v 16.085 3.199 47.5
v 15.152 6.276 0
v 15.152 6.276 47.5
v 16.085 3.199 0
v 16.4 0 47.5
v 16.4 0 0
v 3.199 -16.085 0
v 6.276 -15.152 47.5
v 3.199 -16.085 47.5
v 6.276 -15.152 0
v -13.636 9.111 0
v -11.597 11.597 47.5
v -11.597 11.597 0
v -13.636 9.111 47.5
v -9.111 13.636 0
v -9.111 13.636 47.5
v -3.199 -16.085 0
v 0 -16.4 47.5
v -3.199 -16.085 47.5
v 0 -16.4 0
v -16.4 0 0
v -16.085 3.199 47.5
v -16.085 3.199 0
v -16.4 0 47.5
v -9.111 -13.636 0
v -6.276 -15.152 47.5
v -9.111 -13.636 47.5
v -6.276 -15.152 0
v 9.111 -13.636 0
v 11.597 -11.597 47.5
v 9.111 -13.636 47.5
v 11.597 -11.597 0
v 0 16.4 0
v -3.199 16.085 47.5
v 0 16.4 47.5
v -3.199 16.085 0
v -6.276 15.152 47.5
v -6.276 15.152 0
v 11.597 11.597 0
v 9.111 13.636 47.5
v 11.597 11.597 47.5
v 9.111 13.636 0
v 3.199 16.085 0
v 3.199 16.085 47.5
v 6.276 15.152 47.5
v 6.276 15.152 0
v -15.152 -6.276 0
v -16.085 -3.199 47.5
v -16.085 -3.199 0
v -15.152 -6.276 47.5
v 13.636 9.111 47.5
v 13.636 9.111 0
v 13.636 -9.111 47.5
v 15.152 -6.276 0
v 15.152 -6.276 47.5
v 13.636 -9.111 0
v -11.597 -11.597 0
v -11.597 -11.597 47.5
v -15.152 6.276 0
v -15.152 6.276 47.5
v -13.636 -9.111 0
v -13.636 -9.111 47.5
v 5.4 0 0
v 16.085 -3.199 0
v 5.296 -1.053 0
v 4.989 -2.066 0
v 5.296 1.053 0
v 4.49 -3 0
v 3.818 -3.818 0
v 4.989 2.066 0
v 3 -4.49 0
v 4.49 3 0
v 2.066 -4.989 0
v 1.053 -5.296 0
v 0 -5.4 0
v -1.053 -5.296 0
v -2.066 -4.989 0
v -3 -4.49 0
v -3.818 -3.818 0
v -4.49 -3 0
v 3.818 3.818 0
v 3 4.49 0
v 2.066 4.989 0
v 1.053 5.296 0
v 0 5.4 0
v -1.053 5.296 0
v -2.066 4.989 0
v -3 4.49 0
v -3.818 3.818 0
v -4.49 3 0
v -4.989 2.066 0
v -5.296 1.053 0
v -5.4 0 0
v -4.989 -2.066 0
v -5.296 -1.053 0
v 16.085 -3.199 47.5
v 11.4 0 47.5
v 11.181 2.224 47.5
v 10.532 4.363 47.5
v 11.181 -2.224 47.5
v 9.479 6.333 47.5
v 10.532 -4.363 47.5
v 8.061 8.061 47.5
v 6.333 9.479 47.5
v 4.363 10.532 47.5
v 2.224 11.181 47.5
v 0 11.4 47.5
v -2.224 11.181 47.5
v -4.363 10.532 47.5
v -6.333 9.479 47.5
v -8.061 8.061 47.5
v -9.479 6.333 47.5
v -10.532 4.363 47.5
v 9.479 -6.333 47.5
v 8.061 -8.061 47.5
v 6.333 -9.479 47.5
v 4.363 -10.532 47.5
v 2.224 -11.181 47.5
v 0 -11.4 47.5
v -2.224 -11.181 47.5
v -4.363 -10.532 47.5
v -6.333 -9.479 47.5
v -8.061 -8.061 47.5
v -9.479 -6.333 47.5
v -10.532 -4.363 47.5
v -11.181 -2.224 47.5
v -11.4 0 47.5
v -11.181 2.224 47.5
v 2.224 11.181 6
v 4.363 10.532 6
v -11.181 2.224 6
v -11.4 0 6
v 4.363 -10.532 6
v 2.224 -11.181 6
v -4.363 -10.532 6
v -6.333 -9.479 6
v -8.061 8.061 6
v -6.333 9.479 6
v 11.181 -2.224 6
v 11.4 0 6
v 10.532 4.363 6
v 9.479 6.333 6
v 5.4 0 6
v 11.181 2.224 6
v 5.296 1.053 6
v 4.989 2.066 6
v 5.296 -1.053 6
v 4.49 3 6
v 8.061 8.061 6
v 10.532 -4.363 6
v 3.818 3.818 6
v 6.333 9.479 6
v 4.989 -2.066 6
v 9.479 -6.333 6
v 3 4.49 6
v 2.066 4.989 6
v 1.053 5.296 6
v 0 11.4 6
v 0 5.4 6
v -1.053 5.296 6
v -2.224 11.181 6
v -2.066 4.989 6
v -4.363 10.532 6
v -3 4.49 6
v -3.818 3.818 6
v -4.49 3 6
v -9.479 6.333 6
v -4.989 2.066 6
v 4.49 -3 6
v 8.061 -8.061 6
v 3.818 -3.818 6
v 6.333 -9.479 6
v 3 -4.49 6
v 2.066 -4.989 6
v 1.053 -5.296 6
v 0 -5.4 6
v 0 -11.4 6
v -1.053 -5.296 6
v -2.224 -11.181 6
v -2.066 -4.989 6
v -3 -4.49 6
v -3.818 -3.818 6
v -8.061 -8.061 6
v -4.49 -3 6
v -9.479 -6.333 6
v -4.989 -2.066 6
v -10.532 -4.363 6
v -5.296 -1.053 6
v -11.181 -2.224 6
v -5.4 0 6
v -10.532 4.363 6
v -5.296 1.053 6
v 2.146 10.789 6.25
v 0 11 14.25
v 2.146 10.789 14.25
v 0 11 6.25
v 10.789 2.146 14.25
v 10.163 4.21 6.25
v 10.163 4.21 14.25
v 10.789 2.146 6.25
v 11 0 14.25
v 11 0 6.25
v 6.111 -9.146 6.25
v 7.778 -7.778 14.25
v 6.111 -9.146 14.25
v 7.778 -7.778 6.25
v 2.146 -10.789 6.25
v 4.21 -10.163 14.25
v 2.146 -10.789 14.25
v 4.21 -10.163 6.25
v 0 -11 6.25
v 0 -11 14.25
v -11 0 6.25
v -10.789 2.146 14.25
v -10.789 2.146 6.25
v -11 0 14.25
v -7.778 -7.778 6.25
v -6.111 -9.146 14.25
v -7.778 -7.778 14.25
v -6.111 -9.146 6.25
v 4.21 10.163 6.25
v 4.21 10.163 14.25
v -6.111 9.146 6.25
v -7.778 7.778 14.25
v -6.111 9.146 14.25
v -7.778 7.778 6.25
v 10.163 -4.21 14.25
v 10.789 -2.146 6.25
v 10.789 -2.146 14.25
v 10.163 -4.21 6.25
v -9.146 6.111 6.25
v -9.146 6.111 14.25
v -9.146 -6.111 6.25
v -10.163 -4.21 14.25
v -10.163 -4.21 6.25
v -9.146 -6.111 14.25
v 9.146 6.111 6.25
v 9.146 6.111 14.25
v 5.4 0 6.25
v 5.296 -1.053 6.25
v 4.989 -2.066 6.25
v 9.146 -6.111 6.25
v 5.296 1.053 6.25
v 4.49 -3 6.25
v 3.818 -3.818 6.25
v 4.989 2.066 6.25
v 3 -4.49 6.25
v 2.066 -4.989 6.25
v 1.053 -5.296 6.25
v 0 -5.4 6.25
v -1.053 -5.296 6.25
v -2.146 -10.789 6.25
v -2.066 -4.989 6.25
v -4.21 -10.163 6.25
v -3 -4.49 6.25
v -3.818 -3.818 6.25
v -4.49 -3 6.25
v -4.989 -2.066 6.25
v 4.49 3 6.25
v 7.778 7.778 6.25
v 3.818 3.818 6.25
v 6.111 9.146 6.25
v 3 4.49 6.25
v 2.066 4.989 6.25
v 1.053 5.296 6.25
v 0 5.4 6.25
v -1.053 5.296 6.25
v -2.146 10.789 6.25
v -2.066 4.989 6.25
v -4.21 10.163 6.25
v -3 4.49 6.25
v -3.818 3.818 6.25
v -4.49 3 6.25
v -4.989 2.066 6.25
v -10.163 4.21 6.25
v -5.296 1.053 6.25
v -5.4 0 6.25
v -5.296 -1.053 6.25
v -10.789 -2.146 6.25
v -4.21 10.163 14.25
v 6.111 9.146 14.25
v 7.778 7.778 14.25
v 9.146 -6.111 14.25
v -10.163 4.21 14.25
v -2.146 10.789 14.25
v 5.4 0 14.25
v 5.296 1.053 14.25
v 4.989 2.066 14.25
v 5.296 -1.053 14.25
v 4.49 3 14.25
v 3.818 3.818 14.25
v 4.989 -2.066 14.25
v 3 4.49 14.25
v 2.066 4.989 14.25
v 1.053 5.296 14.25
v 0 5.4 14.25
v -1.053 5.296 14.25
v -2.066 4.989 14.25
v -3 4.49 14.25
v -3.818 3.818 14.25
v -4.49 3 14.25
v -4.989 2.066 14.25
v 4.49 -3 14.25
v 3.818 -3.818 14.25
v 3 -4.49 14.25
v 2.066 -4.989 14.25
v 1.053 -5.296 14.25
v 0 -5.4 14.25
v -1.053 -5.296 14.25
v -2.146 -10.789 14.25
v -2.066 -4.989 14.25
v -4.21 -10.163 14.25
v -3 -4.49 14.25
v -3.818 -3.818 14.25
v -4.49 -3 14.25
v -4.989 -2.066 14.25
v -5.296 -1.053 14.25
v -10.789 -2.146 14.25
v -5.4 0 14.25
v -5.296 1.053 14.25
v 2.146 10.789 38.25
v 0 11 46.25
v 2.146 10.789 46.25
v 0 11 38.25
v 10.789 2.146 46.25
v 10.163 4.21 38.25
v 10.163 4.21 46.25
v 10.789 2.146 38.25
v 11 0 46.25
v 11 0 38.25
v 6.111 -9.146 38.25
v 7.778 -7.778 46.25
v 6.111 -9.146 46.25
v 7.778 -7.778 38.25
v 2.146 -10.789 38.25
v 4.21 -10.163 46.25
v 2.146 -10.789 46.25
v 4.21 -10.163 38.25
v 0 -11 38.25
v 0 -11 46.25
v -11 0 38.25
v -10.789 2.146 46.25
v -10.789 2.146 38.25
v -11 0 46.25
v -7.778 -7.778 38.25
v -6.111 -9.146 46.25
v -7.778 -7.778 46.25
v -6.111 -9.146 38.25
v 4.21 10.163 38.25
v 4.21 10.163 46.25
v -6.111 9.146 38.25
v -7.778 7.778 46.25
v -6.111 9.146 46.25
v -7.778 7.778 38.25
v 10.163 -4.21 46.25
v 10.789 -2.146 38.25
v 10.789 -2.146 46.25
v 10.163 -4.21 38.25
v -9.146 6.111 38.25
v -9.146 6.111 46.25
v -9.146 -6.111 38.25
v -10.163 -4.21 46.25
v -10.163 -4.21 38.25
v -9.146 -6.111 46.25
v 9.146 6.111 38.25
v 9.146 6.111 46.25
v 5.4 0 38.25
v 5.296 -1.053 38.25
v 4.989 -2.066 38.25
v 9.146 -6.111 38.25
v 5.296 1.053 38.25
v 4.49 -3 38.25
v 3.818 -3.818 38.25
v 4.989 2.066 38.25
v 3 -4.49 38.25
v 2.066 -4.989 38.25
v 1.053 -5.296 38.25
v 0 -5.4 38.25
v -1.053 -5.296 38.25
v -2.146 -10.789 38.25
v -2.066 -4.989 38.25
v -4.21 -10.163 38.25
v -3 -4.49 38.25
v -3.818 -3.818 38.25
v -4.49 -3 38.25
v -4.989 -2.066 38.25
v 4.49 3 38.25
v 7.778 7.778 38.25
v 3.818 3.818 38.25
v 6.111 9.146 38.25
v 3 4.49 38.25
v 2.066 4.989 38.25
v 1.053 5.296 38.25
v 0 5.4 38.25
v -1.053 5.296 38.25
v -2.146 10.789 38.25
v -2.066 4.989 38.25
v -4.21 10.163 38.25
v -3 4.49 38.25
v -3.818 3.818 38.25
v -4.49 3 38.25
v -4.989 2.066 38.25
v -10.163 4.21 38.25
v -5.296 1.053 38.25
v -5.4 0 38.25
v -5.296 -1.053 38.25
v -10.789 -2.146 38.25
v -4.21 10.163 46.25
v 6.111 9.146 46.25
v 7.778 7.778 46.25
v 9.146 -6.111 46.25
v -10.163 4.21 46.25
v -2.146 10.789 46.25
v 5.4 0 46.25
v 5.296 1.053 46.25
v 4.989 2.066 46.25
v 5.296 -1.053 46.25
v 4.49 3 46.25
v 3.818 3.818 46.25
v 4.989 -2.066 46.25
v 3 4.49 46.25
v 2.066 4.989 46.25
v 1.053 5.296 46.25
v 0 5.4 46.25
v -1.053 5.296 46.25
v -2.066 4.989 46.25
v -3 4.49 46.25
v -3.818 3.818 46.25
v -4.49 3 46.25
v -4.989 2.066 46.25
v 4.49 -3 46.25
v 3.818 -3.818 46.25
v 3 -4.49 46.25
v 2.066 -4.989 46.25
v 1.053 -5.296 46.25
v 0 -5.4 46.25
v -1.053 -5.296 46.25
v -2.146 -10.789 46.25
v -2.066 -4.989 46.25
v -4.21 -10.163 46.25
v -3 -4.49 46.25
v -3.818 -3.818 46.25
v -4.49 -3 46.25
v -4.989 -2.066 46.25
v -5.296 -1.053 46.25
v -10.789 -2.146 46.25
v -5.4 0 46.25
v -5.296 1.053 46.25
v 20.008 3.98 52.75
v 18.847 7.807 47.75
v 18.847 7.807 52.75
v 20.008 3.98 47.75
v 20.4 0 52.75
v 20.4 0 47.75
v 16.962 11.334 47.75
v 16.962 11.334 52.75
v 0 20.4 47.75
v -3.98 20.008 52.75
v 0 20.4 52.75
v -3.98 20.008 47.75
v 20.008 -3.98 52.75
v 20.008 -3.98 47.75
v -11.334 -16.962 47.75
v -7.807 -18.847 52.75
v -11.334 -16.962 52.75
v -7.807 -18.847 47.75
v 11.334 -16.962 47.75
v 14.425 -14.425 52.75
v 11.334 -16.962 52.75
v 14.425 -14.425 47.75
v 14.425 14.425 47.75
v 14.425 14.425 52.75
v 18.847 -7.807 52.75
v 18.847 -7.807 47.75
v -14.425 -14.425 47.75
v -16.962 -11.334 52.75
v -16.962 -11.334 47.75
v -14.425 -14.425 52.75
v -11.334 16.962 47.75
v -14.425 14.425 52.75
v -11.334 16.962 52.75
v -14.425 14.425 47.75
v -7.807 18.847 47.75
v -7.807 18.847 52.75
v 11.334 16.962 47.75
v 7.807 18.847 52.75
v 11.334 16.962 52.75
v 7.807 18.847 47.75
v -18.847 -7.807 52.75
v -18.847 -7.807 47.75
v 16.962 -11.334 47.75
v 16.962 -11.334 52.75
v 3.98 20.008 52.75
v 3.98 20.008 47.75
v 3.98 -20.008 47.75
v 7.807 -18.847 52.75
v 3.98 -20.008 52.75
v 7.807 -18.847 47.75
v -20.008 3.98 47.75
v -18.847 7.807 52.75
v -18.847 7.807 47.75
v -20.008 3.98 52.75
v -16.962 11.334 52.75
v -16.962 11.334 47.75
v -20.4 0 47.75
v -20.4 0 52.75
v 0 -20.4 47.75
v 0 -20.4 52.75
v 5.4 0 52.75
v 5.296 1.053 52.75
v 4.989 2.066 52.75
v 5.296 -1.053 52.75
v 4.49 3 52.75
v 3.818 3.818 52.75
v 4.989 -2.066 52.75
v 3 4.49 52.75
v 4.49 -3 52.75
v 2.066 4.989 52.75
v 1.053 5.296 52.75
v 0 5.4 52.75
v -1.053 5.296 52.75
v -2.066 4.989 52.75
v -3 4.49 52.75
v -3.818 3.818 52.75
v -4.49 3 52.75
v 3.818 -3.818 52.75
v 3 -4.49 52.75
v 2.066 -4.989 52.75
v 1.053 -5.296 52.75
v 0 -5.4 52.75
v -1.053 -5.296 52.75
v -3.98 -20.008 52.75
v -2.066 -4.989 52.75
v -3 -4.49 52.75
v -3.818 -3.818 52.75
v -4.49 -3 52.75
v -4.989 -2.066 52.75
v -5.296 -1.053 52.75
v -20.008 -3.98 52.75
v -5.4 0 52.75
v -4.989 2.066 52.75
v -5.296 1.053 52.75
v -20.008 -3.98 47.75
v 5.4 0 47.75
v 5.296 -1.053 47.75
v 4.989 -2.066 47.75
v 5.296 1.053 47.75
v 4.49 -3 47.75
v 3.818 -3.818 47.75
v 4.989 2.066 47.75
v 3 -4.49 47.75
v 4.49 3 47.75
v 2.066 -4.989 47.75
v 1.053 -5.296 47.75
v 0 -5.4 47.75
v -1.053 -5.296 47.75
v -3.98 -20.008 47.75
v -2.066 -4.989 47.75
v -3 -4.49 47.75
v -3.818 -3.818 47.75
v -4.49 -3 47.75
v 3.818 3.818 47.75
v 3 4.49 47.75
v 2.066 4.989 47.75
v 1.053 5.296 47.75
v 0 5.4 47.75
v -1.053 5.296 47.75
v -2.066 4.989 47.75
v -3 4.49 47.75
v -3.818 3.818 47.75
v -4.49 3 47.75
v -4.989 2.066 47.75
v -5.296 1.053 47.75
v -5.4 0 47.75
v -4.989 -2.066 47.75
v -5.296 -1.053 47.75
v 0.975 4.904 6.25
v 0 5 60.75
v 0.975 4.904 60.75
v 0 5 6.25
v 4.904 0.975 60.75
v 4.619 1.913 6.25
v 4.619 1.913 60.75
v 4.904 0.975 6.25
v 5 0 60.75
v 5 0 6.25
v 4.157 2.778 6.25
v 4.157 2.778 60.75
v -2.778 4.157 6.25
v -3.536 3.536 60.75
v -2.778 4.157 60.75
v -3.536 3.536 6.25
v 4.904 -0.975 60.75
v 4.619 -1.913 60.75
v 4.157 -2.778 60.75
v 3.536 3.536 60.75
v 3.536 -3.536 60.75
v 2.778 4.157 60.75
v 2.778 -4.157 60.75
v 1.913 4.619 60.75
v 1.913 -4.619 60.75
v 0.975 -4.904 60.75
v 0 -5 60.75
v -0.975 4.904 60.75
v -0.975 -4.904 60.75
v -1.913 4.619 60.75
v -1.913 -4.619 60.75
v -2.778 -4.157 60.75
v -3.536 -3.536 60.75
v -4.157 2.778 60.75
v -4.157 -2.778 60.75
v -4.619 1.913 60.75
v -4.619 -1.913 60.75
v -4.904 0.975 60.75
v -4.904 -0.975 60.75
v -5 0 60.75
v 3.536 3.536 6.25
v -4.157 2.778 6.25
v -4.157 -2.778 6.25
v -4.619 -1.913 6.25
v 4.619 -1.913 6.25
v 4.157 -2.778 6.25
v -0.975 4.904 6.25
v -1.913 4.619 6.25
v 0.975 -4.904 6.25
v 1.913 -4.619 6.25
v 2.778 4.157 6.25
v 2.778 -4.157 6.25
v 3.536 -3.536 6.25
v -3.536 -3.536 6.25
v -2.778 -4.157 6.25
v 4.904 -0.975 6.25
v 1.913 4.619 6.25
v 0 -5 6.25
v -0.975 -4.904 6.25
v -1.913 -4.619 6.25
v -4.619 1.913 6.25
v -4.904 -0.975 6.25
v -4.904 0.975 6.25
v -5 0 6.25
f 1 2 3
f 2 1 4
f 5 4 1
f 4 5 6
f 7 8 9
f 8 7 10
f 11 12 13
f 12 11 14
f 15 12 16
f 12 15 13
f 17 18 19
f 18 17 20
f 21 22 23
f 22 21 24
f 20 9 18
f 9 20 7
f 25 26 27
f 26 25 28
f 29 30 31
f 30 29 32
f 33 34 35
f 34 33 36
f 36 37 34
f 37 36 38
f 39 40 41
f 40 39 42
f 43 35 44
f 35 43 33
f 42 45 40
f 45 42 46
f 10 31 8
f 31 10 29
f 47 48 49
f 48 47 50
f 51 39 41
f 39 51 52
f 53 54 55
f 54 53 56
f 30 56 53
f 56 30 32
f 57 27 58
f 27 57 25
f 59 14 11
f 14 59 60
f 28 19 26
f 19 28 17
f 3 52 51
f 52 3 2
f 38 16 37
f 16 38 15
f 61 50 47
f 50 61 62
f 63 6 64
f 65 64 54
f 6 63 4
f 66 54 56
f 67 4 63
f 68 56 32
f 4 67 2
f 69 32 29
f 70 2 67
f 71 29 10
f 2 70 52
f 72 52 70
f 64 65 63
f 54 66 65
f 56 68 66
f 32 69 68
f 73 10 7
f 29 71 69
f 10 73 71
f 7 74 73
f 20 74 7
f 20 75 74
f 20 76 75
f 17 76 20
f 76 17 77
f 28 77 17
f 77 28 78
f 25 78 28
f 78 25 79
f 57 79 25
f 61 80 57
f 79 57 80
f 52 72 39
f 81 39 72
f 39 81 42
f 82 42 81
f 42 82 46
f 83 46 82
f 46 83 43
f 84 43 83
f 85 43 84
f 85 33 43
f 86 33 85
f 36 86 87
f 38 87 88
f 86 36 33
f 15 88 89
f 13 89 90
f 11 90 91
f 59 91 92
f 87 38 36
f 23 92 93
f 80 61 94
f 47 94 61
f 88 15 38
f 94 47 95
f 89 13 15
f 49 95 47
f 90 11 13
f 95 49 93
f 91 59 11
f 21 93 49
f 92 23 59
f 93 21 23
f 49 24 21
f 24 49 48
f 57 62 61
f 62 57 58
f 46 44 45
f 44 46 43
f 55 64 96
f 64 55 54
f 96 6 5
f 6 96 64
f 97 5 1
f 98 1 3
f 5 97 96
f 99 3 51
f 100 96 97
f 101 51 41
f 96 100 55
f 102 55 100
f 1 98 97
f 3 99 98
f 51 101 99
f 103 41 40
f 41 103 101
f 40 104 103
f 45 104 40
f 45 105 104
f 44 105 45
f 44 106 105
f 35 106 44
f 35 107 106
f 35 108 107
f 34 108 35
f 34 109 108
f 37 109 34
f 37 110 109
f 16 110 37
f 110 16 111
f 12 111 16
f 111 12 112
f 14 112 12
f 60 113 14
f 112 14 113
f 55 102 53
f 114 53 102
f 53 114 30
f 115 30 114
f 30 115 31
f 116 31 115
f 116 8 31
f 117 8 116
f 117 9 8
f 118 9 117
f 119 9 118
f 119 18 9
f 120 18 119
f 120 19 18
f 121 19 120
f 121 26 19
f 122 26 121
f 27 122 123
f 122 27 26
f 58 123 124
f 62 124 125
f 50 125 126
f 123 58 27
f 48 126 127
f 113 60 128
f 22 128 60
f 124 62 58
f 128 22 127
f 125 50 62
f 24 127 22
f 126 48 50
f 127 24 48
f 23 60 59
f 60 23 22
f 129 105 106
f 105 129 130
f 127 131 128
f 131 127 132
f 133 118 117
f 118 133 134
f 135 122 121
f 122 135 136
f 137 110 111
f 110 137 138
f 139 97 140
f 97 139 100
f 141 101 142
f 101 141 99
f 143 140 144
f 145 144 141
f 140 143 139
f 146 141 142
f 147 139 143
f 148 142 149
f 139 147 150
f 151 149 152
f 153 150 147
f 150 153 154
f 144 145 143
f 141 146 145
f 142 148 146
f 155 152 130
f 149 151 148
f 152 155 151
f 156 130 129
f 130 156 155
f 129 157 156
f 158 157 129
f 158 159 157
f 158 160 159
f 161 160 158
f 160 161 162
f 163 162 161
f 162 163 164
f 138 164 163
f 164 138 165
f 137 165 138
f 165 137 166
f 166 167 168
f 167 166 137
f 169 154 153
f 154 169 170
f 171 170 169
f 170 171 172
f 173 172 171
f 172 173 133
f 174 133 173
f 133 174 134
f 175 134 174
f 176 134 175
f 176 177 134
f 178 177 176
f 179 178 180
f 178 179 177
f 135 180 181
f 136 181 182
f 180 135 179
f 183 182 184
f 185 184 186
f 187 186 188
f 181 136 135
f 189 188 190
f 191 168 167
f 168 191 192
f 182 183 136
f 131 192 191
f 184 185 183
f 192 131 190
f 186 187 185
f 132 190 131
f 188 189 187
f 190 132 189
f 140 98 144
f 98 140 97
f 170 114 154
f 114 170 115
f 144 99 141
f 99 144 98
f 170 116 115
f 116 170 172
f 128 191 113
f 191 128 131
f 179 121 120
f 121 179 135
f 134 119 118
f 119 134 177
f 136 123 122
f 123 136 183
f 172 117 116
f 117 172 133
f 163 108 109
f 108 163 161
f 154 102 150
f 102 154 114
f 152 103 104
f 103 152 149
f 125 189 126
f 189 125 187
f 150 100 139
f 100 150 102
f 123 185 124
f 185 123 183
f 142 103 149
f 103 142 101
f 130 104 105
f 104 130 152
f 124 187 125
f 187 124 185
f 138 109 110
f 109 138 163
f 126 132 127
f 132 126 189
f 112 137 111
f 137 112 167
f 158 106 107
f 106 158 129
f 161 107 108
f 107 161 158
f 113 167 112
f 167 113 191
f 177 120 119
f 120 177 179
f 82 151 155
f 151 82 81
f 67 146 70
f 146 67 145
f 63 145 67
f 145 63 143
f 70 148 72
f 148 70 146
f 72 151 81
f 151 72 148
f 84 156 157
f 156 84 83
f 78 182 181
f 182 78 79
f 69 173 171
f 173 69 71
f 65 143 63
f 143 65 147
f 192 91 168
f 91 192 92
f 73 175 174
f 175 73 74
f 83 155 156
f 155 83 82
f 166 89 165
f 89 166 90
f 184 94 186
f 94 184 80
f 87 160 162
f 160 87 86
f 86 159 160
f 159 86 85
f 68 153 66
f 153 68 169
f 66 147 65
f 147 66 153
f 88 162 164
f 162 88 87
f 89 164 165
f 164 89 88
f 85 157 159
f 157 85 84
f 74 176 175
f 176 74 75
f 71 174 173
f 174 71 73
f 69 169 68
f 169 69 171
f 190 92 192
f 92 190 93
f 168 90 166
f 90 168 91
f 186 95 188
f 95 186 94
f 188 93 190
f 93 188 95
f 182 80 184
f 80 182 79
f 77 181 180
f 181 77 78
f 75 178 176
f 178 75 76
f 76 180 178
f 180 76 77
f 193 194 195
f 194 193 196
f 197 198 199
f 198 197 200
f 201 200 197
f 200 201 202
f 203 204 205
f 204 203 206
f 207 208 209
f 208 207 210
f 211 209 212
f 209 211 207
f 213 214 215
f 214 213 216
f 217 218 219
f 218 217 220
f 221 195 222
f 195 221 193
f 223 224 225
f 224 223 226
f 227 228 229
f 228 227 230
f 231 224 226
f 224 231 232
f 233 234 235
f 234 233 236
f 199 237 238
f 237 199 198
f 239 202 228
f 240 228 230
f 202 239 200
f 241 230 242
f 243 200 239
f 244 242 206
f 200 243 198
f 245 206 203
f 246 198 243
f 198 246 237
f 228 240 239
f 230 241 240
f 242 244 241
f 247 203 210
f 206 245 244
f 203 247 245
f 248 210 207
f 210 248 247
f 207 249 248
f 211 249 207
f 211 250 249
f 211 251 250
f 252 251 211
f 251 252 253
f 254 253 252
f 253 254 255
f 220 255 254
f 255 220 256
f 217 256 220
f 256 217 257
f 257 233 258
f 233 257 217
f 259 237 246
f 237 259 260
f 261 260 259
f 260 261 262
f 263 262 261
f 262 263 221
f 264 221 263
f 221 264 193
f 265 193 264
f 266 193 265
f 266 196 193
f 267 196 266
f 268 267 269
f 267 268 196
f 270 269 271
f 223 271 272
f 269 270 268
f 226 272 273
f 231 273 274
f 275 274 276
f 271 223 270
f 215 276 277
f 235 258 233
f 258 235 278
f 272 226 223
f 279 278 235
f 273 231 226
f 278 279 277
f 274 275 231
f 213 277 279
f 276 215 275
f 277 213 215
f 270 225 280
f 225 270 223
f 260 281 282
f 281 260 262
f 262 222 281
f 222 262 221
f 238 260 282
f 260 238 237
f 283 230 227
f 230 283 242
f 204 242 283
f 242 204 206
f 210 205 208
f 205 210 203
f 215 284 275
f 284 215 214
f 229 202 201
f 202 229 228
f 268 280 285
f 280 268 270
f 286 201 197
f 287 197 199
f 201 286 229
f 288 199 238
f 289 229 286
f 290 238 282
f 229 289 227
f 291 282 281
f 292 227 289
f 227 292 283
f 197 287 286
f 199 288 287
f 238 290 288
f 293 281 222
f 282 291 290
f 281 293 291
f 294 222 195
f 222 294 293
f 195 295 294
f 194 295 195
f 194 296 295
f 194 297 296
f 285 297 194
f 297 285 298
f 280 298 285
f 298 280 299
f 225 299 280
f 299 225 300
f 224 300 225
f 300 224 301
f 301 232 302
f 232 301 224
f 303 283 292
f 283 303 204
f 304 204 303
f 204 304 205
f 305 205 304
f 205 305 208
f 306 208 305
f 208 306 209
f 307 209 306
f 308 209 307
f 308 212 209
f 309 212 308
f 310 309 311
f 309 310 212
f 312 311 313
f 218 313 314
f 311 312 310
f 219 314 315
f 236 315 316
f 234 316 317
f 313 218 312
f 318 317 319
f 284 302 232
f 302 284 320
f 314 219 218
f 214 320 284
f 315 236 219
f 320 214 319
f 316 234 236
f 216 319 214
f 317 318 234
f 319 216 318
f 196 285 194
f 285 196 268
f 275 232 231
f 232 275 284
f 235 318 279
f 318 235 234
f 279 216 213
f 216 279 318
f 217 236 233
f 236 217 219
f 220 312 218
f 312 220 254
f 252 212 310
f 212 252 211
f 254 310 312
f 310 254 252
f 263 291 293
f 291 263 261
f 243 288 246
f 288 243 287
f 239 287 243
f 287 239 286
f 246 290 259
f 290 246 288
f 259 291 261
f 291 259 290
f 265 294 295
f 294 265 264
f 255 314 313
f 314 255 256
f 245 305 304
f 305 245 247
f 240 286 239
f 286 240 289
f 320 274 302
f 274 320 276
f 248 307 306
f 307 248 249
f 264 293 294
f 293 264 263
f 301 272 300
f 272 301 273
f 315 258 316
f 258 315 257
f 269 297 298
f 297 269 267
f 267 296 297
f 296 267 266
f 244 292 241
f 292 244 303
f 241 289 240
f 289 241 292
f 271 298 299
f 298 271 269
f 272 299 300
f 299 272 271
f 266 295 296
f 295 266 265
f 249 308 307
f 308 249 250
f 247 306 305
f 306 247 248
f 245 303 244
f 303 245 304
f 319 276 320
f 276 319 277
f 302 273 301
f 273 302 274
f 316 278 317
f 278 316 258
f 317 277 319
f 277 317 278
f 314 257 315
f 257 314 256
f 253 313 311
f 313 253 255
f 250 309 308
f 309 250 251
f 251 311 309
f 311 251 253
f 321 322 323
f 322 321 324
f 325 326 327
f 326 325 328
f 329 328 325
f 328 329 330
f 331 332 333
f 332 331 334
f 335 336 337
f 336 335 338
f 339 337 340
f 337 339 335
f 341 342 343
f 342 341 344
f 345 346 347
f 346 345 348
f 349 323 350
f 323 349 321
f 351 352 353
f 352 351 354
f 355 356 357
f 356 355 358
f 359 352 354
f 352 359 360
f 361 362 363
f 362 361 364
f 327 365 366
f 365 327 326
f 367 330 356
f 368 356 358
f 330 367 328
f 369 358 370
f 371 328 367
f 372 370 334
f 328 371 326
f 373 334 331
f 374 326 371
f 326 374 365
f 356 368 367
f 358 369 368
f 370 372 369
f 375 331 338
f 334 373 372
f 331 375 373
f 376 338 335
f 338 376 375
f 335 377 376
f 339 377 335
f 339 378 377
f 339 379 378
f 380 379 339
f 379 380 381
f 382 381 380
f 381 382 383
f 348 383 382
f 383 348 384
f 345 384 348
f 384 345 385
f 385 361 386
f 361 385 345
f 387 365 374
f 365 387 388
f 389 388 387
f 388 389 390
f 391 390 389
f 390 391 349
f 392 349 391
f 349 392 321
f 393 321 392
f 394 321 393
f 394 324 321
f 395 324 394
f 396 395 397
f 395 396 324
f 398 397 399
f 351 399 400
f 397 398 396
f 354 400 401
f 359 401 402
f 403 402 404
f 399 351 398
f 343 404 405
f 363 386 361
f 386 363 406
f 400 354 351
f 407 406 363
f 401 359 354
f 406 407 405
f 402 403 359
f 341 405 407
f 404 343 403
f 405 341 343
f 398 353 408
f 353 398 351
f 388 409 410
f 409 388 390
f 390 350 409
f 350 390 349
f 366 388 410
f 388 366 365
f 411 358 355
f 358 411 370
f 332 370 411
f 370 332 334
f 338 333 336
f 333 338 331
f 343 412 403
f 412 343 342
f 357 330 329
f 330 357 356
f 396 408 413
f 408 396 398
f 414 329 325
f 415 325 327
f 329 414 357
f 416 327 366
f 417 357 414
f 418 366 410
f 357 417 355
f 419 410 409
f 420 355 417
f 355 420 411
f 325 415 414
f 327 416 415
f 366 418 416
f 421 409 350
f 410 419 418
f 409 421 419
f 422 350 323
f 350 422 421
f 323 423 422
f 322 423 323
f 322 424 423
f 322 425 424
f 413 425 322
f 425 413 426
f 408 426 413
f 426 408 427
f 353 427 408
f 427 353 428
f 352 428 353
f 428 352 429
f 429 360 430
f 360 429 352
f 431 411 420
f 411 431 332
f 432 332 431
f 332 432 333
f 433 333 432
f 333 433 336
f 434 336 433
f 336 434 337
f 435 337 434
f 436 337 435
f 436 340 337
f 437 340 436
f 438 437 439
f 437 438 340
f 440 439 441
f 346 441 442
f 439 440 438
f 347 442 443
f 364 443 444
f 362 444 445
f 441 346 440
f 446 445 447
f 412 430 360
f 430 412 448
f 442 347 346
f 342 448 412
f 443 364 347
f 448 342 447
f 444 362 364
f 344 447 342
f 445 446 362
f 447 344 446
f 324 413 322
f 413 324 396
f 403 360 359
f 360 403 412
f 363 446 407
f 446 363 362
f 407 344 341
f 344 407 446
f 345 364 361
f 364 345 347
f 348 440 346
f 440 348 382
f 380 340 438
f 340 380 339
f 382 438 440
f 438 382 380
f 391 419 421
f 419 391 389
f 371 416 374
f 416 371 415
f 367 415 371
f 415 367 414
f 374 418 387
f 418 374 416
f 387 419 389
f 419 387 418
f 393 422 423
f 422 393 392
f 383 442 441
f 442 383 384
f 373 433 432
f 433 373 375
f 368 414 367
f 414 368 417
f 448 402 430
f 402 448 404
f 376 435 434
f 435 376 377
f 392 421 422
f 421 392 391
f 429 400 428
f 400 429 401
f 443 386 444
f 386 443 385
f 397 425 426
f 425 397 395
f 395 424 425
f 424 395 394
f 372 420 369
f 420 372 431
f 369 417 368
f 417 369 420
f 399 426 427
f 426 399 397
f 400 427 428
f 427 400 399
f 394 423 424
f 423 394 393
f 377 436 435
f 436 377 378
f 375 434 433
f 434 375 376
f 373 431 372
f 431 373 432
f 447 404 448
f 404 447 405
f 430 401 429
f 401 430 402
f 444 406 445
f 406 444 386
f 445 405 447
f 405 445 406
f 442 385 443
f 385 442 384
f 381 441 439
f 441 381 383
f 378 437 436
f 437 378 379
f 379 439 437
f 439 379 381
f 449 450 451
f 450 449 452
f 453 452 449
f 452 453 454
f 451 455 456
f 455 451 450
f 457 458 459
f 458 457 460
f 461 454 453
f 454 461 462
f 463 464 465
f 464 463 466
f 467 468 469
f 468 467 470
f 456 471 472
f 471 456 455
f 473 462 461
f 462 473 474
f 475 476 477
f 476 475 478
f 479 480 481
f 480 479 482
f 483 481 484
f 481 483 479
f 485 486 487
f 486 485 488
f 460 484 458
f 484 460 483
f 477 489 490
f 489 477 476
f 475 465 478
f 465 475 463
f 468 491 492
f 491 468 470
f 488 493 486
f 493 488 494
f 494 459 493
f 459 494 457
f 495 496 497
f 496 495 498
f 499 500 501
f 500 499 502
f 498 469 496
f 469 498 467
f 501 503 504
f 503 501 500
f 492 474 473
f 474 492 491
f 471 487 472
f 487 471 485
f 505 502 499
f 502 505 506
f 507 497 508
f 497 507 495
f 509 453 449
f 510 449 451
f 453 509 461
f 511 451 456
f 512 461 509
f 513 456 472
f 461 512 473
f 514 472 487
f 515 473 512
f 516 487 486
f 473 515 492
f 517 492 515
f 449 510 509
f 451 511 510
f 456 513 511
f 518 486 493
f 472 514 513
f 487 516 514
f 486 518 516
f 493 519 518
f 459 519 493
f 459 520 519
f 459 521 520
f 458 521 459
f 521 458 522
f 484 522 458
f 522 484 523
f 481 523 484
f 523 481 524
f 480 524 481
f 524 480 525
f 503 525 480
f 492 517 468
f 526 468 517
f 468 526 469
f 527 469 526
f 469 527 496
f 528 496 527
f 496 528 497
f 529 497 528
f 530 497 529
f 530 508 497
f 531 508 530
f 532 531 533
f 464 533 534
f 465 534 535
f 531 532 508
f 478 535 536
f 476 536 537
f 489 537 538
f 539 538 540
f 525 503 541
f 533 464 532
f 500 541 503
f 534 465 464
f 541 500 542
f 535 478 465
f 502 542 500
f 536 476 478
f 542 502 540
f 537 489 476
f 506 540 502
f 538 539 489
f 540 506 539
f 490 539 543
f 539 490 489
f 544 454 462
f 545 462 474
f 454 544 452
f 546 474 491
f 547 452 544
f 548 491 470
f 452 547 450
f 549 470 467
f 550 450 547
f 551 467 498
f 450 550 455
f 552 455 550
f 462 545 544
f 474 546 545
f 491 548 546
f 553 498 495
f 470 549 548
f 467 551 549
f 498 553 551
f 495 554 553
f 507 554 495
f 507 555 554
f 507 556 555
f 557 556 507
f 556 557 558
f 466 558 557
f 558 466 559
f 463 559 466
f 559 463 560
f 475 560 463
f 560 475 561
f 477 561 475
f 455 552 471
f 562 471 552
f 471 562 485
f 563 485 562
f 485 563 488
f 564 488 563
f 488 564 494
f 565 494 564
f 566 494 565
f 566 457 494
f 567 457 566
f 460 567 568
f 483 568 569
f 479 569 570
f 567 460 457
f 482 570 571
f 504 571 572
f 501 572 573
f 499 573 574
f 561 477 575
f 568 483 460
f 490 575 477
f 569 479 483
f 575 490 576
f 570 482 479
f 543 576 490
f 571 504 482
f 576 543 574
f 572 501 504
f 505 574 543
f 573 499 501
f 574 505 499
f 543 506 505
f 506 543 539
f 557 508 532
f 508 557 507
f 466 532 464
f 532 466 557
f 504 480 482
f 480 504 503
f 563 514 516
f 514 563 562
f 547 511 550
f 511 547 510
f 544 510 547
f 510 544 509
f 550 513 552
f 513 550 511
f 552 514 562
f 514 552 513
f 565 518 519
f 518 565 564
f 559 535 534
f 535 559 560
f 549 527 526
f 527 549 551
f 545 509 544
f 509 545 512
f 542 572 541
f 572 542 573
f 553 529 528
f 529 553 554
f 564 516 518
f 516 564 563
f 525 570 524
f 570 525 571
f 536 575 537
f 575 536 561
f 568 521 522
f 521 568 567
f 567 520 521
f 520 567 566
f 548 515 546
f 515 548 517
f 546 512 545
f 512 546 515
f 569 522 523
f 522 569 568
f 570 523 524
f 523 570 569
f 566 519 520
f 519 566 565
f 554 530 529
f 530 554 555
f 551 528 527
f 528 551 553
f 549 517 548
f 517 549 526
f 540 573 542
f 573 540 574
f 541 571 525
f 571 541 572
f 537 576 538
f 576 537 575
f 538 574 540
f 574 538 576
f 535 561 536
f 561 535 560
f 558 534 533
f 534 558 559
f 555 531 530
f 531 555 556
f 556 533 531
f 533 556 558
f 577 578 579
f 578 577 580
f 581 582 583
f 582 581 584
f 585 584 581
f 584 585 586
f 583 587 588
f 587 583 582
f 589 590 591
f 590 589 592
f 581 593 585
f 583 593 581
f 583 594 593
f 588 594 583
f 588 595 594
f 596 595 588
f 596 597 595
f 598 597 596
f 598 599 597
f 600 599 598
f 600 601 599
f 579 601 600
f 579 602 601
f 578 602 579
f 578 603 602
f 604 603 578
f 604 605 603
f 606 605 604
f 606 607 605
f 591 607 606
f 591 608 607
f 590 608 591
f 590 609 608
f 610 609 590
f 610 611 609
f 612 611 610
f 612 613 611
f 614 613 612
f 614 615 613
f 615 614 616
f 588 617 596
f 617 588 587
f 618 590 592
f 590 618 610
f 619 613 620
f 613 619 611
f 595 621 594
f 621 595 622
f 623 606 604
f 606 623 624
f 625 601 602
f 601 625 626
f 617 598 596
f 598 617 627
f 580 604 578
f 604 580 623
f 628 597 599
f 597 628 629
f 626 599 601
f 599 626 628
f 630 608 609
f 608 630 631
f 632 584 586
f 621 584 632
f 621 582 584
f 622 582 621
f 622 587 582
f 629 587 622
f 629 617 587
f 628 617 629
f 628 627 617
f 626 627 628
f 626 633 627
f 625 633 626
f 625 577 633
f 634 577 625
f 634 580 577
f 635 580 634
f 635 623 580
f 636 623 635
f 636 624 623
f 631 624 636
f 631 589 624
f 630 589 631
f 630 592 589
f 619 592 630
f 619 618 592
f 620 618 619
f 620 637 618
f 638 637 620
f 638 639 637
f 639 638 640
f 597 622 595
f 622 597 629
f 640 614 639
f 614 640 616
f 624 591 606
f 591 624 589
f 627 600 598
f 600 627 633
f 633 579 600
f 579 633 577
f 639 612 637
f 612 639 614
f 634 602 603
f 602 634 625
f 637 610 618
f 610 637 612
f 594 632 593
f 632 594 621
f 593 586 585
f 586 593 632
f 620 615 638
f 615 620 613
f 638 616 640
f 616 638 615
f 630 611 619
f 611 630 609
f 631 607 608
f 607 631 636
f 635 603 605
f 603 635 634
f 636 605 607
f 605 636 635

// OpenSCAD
$fn = 32;

// ------------------------------------------------------------------------
// Shaft station: cup d32.8 x 47.5 mm, shaft d10
// Every part is its own module, assembly() places every instance.
// ------------------------------------------------------------------------

// --- part 1 ---
module housing_cup() {
  difference() {
    cylinder(h = 47.5, d = 32.8);
    translate([0, 0, 6]) cylinder(h = 42.5, d = 22.8);
    translate([0, 0, -1]) cylinder(h = 8, d = 10.8);
  }
}

// --- part 2 ---
module bearing_lower() {
  difference() {
      translate([0, 0, 0]) cylinder(h = 8, d = 22);
      translate([0, 0, -1]) cylinder(h = 10, d = 10.8);
    }
}

// --- part 3 ---
module bearing_upper() {
  difference() {
      translate([0, 0, 0]) cylinder(h = 8, d = 22);
      translate([0, 0, -1]) cylinder(h = 10, d = 10.8);
    }
}

// --- part 4 ---
module station_shaft() {
  translate([0, 0, -27.25]) cylinder(h = 54.5, d = 10);
}

// --- part 5 ---
module station_cover() {
  difference() {
    cylinder(h = 5, d = 40.8);
    translate([0, 0, -1]) cylinder(h = 7, d = 10.8);
  }
}

// --- assembly ---
module assembly() {
  color([0.80, 0.24, 0.20]) translate([0, 0, 0]) rotate([0, 0, 0]) housing_cup();
  color([0.20, 0.45, 0.75]) translate([0, 0, 6.25]) rotate([0, 0, 0]) bearing_lower();
  color([0.25, 0.62, 0.32]) translate([0, 0, 38.25]) rotate([0, 0, 0]) bearing_upper();
  color([0.92, 0.70, 0.18]) translate([0, 0, 33.5]) rotate([0, 0, 0]) station_shaft();
  color([0.58, 0.35, 0.70]) translate([0, 0, 47.75]) rotate([0, 0, 0]) station_cover();
}

assembly();
